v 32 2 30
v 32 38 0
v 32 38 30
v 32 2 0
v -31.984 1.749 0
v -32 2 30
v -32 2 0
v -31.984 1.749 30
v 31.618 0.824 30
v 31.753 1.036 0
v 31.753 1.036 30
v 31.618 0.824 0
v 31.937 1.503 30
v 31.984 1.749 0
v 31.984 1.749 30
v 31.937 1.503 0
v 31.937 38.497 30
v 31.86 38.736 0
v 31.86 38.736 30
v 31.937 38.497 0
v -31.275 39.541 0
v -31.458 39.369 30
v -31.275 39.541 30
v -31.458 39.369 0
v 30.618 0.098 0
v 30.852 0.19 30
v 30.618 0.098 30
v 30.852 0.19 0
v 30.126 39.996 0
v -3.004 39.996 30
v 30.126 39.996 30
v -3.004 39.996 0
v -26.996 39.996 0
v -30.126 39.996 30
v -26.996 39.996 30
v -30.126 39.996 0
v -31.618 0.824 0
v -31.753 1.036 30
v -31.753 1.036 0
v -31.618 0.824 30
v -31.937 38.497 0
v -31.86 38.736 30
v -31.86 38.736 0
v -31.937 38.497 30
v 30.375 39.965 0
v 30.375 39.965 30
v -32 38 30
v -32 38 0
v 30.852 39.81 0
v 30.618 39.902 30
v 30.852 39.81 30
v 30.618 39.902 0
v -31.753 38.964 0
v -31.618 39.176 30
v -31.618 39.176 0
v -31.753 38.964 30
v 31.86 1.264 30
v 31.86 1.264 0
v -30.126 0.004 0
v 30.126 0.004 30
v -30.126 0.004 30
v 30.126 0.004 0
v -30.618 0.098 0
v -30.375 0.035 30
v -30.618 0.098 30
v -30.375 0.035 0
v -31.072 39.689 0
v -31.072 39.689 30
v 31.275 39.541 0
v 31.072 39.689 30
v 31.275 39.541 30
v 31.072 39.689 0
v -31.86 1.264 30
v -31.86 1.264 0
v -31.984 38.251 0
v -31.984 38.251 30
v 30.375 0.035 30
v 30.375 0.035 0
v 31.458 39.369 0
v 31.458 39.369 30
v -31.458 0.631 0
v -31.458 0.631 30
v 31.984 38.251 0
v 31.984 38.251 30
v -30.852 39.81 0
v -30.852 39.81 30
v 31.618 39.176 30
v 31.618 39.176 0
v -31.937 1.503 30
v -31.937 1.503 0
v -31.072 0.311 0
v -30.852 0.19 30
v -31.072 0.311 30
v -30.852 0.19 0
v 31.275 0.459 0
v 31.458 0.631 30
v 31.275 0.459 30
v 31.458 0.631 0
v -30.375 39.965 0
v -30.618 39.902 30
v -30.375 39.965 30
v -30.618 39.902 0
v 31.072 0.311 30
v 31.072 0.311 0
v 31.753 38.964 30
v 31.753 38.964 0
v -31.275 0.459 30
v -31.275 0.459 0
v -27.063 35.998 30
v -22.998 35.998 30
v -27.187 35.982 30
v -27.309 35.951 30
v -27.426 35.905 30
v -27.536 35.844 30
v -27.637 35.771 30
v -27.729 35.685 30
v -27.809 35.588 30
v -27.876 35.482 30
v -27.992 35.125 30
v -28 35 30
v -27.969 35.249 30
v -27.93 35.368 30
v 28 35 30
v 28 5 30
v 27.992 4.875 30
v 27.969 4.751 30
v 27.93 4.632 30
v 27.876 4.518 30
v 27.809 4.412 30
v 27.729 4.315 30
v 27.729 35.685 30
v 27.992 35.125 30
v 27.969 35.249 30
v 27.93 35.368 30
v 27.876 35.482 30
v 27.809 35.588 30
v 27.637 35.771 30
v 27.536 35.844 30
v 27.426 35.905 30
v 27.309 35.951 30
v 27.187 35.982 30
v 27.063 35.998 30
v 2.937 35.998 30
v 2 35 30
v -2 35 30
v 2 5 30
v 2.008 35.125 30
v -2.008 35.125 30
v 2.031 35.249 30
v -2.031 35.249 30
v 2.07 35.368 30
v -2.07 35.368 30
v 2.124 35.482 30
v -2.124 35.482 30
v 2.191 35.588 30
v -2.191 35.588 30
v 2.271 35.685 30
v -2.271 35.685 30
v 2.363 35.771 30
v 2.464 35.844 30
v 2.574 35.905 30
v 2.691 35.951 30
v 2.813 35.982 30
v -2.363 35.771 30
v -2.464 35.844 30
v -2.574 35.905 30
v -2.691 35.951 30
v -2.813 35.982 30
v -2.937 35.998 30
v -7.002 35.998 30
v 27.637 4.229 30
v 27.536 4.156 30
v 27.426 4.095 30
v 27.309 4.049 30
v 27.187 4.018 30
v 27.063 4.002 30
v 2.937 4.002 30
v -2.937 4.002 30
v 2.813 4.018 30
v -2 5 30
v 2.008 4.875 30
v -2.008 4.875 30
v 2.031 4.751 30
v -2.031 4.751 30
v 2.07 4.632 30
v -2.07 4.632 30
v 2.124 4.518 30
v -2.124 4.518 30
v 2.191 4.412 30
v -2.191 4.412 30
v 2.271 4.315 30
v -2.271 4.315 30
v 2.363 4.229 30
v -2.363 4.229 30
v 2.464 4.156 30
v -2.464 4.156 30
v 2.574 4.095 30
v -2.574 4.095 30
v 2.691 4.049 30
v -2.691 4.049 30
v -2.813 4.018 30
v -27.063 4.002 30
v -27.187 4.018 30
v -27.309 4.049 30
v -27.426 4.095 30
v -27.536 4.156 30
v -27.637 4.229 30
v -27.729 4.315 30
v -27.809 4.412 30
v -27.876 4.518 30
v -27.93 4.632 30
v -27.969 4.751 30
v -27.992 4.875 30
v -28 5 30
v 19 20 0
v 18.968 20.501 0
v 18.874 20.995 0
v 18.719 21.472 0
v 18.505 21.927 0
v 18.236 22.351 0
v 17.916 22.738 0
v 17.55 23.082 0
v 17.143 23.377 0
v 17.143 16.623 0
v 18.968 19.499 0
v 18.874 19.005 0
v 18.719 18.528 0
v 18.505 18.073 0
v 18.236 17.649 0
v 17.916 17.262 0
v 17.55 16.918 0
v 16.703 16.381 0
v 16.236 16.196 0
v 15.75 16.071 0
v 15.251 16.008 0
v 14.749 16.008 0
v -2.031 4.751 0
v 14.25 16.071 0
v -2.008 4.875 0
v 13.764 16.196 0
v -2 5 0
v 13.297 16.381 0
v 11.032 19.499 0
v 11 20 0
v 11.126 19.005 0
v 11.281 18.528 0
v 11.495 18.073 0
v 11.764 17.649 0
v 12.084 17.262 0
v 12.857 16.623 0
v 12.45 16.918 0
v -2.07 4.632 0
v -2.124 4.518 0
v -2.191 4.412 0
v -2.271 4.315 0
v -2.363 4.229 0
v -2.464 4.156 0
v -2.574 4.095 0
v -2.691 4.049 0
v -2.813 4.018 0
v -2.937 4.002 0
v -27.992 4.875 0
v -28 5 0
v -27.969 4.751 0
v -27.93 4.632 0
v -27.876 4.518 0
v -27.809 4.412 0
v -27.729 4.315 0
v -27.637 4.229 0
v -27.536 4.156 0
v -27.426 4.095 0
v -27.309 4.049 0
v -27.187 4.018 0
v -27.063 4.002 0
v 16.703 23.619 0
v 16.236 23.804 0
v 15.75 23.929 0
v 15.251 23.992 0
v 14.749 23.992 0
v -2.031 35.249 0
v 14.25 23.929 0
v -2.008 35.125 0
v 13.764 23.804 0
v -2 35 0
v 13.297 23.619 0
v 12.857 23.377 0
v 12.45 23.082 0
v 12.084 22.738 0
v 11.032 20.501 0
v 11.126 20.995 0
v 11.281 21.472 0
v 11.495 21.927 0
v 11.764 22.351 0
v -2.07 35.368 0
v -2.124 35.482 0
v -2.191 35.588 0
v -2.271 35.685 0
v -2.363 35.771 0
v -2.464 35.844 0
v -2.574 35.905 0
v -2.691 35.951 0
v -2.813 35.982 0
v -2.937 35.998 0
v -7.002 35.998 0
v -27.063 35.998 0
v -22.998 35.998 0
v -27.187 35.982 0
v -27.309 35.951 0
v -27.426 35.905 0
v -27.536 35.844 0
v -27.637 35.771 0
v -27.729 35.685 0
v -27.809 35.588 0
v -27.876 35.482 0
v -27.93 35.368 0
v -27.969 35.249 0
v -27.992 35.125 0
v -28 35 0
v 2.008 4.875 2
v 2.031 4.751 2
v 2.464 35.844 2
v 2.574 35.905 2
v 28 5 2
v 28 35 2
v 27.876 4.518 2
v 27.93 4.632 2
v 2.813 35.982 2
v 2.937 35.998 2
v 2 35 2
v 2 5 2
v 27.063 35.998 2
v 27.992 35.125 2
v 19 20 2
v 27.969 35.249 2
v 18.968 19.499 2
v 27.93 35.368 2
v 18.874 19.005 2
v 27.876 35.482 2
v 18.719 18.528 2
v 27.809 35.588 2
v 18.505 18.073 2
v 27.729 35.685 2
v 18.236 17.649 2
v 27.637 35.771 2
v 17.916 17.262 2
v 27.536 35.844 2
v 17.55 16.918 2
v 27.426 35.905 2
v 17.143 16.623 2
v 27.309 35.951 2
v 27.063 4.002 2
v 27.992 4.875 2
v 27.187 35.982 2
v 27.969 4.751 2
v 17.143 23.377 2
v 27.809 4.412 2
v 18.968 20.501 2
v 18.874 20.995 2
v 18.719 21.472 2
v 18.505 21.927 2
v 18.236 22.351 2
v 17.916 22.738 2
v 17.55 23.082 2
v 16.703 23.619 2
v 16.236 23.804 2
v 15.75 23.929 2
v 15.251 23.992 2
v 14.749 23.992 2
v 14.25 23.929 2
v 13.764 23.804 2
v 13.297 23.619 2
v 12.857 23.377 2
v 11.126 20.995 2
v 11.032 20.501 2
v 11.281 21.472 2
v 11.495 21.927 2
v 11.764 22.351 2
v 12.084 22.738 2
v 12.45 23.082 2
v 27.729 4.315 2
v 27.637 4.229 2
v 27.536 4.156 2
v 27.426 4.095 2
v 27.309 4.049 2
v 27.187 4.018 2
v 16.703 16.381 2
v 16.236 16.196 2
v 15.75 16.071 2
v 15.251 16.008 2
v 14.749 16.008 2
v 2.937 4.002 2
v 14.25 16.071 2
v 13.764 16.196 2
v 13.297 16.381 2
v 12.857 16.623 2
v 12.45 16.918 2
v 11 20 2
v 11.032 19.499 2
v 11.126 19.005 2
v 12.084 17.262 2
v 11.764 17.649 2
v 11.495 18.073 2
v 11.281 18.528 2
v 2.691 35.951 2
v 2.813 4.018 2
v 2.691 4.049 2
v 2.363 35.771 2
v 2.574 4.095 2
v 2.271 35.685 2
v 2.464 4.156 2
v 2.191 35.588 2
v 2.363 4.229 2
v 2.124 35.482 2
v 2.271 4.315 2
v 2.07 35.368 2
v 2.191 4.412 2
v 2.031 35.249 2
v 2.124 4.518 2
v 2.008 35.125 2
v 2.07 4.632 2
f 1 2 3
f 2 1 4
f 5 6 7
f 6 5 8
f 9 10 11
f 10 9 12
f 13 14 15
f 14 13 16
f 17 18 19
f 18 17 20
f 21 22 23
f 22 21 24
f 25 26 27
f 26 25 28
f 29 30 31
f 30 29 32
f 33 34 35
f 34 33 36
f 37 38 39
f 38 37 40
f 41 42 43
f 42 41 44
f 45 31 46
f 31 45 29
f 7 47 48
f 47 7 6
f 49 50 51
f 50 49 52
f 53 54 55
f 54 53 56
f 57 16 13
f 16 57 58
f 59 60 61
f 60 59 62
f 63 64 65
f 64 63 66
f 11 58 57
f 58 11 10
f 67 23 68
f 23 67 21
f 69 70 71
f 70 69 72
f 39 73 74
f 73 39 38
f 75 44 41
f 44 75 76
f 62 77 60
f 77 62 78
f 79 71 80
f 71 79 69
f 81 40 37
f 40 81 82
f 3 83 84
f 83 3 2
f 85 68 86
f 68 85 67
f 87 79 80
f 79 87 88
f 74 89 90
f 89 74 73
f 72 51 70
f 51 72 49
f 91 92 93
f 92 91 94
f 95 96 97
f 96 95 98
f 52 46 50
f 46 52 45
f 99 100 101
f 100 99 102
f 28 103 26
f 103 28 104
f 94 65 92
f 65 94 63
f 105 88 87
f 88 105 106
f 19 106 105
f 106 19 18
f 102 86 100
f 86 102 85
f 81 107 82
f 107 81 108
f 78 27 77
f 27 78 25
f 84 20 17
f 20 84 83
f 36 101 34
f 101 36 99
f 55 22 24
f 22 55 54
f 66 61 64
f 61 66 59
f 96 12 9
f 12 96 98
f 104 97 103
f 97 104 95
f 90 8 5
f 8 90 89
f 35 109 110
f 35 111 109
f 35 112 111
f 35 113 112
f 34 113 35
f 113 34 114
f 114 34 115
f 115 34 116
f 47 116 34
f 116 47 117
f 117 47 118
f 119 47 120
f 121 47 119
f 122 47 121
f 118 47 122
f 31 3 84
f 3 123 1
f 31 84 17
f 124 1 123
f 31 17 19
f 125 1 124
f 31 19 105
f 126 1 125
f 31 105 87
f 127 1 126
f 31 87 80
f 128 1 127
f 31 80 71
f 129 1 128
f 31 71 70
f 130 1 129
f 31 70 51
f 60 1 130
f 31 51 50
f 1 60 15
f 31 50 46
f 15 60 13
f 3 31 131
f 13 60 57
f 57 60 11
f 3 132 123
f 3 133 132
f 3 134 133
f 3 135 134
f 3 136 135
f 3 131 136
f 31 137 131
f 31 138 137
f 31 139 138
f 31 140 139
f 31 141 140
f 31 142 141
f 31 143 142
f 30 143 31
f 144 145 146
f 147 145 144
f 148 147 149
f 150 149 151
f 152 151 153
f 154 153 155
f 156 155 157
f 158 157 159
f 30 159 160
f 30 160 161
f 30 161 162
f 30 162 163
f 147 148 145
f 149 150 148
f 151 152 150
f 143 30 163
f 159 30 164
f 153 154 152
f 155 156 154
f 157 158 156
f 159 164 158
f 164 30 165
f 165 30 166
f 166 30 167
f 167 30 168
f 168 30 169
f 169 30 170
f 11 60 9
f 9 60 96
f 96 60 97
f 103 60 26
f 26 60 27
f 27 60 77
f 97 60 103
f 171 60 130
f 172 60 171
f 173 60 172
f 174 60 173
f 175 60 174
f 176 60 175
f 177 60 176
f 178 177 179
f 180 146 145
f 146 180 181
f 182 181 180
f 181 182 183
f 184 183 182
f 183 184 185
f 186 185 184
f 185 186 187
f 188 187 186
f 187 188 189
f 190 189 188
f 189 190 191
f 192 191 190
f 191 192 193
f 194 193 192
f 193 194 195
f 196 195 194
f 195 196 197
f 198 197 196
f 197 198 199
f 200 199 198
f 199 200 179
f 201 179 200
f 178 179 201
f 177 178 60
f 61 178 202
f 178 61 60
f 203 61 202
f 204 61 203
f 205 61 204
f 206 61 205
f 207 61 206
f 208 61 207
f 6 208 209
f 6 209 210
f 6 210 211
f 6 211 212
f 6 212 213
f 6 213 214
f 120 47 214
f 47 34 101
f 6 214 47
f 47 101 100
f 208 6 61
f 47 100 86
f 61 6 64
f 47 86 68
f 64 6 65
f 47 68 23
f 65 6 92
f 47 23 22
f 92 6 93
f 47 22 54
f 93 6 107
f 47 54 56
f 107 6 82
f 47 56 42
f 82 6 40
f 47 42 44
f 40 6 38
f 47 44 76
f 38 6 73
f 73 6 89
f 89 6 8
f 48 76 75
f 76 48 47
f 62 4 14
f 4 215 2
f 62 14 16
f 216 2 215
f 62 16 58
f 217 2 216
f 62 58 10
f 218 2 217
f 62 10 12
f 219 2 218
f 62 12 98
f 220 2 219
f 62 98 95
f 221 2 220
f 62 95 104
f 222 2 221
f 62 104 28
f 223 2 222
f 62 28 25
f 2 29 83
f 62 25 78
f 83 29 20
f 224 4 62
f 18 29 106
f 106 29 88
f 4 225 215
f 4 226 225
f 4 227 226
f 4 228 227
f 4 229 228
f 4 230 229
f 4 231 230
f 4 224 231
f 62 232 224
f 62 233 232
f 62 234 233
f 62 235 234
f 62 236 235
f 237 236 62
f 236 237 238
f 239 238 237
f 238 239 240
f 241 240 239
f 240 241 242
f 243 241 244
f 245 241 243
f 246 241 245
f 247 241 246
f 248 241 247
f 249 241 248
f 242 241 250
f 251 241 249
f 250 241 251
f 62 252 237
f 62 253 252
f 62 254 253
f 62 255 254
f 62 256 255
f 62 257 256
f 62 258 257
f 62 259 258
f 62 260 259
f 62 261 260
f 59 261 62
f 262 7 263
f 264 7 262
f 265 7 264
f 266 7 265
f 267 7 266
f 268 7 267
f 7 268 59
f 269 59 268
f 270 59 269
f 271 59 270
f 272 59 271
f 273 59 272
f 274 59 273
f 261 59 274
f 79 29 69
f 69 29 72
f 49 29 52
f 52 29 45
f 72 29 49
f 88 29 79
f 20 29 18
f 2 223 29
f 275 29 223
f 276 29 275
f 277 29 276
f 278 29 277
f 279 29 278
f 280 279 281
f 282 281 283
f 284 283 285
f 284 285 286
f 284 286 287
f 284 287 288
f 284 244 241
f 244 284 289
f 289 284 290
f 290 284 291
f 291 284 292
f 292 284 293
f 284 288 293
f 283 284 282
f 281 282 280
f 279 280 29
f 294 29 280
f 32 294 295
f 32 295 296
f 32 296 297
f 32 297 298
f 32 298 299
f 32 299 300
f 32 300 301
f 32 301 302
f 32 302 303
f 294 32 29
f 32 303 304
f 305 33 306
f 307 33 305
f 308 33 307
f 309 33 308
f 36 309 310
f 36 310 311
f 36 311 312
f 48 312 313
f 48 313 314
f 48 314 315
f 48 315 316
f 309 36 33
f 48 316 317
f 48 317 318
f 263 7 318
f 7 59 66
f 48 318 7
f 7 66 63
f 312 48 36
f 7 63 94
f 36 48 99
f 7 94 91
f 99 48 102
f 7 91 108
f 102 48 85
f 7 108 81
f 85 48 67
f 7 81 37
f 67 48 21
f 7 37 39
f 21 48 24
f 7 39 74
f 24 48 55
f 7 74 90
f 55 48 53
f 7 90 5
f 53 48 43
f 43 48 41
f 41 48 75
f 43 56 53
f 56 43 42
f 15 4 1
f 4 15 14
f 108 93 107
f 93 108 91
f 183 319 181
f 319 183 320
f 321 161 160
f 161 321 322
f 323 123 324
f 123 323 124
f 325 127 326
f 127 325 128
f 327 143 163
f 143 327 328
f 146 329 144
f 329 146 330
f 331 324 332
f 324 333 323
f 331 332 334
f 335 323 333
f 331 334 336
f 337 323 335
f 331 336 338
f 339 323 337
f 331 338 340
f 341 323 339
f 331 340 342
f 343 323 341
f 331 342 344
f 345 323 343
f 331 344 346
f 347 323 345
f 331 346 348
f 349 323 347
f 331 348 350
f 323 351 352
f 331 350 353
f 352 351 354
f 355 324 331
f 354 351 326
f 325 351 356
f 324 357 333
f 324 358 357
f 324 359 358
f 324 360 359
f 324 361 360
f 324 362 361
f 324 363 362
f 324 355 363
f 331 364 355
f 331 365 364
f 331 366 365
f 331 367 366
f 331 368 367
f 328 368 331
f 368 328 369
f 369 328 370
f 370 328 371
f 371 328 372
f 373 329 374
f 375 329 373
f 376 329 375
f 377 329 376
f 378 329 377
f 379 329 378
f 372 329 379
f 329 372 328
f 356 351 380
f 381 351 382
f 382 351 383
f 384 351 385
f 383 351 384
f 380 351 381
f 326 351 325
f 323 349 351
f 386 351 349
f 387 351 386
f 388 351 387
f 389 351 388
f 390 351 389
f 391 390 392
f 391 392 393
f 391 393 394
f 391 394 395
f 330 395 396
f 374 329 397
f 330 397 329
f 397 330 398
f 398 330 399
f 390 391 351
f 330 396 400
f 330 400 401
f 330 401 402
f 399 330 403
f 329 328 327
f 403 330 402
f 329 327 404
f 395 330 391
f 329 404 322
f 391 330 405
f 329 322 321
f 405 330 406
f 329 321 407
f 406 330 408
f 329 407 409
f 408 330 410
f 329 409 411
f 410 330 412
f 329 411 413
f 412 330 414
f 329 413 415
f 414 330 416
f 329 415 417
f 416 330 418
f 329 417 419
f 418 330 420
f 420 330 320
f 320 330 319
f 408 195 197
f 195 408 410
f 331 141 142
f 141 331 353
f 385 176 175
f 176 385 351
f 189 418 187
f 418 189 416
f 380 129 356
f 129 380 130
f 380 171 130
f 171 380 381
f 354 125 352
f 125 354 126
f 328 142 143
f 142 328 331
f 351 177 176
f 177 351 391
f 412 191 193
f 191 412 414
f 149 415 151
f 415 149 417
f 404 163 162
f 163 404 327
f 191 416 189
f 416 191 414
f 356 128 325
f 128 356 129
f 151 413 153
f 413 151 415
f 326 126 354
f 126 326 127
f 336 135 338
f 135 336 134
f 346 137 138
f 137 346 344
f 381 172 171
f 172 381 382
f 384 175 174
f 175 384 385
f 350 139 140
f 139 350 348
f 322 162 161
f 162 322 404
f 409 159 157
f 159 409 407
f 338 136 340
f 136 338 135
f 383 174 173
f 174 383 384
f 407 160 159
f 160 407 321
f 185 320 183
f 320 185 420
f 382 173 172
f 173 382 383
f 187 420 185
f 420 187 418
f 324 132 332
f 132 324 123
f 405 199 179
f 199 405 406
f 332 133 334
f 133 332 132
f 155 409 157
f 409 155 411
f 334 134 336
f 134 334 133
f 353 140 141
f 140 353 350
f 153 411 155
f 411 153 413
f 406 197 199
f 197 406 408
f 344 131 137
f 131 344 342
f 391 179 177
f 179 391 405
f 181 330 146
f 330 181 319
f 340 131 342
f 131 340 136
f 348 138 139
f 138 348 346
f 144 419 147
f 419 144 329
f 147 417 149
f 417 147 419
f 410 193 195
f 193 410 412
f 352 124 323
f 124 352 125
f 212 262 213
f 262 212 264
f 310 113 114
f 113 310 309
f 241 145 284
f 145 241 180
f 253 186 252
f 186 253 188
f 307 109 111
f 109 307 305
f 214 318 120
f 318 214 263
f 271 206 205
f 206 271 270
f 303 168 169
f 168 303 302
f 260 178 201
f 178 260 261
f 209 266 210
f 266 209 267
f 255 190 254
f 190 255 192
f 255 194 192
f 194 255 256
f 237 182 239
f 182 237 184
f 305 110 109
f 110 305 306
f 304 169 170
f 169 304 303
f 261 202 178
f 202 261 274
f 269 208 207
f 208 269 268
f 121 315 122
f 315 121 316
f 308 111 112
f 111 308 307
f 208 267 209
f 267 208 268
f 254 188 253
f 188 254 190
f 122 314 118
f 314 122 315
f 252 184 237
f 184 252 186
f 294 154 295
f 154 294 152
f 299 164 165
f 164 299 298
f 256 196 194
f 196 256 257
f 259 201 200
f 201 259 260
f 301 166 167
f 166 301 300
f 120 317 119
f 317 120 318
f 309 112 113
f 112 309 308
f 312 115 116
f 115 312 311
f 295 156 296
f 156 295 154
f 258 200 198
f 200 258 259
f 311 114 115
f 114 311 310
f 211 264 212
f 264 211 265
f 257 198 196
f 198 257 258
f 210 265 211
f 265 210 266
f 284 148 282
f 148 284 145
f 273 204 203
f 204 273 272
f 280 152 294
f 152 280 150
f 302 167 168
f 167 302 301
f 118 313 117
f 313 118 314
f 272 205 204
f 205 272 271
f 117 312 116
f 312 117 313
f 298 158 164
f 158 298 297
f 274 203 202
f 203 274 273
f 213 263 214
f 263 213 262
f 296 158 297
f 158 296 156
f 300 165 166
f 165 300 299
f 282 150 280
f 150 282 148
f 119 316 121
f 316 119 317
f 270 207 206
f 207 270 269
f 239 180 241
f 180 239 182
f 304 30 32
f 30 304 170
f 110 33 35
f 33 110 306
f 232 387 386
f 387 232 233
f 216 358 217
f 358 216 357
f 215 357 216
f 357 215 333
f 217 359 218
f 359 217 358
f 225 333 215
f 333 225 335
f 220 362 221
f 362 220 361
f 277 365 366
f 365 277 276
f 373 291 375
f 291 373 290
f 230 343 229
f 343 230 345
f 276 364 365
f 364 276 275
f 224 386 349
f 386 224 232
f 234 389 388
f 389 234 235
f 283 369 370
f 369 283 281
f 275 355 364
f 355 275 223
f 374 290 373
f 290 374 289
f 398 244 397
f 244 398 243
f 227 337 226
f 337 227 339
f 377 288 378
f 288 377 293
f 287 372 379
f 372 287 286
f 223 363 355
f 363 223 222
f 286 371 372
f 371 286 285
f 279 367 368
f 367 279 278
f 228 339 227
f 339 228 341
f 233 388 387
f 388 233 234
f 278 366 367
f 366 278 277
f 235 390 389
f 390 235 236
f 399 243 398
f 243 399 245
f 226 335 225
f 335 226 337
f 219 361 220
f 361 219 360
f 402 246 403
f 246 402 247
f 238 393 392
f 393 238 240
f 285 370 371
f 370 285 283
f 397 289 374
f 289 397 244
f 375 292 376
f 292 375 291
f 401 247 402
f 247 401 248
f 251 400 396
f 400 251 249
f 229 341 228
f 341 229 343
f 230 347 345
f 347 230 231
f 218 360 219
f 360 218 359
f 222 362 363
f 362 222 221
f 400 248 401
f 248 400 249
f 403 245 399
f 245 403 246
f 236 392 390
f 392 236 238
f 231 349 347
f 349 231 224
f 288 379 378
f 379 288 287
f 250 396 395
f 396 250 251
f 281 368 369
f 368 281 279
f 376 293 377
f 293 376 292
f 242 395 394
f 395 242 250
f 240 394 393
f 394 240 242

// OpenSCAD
WTOL = 2;
WOOD_W = 24+WTOL;
WOOD_H = 30+WTOL;
WALL = 4;
WALL_BOTTOM = 2;
LENGTH = 30;
SCREW_R = 6/3;
TOOTH = 5;
TOL = 1;

$fn = 50;

module cube_zround (wlh, r) {
    w = wlh[0];
    l = wlh[1];
    h = wlh[2];
    hull () for (x=[r,w-r]) for (y=[r,l-r]) {
        translate ([x, y, 0]) cylinder (h, r=r);
    }
}

difference () {
    translate ([-WOOD_W-WALL*3/2, 0, 0]) {
        cube_zround ([WOOD_W*2 + WALL*3, WOOD_H + WALL*2, LENGTH], WALL/2);
    }
    translate ([WALL/2, WALL, WALL_BOTTOM]) {
        cube_zround ([WOOD_W, WOOD_H, 100], WALL/4);
    }
    translate ([-WOOD_W-WALL/2, WALL, -WALL]) {
        cube_zround ([WOOD_W, WOOD_H, 100], WALL/4);
    }
    translate ([-WOOD_W-WALL/2+TOOTH*2, WALL+WOOD_H-TOOTH, -WALL]) hull() {
        cube ([WOOD_W-TOOTH*4, WALL, 100]);
        translate ([-WALL*2-TOOTH*2, WALL*2+TOOTH*2, 0]) {
            cube ([WOOD_W+WALL*4, WALL, 100]);
        }
    }
    translate ([WOOD_W/2+WALL/2, WALL+WOOD_H/2, -1]) cylinder(100, r=SCREW_R+TOL*2);
}
